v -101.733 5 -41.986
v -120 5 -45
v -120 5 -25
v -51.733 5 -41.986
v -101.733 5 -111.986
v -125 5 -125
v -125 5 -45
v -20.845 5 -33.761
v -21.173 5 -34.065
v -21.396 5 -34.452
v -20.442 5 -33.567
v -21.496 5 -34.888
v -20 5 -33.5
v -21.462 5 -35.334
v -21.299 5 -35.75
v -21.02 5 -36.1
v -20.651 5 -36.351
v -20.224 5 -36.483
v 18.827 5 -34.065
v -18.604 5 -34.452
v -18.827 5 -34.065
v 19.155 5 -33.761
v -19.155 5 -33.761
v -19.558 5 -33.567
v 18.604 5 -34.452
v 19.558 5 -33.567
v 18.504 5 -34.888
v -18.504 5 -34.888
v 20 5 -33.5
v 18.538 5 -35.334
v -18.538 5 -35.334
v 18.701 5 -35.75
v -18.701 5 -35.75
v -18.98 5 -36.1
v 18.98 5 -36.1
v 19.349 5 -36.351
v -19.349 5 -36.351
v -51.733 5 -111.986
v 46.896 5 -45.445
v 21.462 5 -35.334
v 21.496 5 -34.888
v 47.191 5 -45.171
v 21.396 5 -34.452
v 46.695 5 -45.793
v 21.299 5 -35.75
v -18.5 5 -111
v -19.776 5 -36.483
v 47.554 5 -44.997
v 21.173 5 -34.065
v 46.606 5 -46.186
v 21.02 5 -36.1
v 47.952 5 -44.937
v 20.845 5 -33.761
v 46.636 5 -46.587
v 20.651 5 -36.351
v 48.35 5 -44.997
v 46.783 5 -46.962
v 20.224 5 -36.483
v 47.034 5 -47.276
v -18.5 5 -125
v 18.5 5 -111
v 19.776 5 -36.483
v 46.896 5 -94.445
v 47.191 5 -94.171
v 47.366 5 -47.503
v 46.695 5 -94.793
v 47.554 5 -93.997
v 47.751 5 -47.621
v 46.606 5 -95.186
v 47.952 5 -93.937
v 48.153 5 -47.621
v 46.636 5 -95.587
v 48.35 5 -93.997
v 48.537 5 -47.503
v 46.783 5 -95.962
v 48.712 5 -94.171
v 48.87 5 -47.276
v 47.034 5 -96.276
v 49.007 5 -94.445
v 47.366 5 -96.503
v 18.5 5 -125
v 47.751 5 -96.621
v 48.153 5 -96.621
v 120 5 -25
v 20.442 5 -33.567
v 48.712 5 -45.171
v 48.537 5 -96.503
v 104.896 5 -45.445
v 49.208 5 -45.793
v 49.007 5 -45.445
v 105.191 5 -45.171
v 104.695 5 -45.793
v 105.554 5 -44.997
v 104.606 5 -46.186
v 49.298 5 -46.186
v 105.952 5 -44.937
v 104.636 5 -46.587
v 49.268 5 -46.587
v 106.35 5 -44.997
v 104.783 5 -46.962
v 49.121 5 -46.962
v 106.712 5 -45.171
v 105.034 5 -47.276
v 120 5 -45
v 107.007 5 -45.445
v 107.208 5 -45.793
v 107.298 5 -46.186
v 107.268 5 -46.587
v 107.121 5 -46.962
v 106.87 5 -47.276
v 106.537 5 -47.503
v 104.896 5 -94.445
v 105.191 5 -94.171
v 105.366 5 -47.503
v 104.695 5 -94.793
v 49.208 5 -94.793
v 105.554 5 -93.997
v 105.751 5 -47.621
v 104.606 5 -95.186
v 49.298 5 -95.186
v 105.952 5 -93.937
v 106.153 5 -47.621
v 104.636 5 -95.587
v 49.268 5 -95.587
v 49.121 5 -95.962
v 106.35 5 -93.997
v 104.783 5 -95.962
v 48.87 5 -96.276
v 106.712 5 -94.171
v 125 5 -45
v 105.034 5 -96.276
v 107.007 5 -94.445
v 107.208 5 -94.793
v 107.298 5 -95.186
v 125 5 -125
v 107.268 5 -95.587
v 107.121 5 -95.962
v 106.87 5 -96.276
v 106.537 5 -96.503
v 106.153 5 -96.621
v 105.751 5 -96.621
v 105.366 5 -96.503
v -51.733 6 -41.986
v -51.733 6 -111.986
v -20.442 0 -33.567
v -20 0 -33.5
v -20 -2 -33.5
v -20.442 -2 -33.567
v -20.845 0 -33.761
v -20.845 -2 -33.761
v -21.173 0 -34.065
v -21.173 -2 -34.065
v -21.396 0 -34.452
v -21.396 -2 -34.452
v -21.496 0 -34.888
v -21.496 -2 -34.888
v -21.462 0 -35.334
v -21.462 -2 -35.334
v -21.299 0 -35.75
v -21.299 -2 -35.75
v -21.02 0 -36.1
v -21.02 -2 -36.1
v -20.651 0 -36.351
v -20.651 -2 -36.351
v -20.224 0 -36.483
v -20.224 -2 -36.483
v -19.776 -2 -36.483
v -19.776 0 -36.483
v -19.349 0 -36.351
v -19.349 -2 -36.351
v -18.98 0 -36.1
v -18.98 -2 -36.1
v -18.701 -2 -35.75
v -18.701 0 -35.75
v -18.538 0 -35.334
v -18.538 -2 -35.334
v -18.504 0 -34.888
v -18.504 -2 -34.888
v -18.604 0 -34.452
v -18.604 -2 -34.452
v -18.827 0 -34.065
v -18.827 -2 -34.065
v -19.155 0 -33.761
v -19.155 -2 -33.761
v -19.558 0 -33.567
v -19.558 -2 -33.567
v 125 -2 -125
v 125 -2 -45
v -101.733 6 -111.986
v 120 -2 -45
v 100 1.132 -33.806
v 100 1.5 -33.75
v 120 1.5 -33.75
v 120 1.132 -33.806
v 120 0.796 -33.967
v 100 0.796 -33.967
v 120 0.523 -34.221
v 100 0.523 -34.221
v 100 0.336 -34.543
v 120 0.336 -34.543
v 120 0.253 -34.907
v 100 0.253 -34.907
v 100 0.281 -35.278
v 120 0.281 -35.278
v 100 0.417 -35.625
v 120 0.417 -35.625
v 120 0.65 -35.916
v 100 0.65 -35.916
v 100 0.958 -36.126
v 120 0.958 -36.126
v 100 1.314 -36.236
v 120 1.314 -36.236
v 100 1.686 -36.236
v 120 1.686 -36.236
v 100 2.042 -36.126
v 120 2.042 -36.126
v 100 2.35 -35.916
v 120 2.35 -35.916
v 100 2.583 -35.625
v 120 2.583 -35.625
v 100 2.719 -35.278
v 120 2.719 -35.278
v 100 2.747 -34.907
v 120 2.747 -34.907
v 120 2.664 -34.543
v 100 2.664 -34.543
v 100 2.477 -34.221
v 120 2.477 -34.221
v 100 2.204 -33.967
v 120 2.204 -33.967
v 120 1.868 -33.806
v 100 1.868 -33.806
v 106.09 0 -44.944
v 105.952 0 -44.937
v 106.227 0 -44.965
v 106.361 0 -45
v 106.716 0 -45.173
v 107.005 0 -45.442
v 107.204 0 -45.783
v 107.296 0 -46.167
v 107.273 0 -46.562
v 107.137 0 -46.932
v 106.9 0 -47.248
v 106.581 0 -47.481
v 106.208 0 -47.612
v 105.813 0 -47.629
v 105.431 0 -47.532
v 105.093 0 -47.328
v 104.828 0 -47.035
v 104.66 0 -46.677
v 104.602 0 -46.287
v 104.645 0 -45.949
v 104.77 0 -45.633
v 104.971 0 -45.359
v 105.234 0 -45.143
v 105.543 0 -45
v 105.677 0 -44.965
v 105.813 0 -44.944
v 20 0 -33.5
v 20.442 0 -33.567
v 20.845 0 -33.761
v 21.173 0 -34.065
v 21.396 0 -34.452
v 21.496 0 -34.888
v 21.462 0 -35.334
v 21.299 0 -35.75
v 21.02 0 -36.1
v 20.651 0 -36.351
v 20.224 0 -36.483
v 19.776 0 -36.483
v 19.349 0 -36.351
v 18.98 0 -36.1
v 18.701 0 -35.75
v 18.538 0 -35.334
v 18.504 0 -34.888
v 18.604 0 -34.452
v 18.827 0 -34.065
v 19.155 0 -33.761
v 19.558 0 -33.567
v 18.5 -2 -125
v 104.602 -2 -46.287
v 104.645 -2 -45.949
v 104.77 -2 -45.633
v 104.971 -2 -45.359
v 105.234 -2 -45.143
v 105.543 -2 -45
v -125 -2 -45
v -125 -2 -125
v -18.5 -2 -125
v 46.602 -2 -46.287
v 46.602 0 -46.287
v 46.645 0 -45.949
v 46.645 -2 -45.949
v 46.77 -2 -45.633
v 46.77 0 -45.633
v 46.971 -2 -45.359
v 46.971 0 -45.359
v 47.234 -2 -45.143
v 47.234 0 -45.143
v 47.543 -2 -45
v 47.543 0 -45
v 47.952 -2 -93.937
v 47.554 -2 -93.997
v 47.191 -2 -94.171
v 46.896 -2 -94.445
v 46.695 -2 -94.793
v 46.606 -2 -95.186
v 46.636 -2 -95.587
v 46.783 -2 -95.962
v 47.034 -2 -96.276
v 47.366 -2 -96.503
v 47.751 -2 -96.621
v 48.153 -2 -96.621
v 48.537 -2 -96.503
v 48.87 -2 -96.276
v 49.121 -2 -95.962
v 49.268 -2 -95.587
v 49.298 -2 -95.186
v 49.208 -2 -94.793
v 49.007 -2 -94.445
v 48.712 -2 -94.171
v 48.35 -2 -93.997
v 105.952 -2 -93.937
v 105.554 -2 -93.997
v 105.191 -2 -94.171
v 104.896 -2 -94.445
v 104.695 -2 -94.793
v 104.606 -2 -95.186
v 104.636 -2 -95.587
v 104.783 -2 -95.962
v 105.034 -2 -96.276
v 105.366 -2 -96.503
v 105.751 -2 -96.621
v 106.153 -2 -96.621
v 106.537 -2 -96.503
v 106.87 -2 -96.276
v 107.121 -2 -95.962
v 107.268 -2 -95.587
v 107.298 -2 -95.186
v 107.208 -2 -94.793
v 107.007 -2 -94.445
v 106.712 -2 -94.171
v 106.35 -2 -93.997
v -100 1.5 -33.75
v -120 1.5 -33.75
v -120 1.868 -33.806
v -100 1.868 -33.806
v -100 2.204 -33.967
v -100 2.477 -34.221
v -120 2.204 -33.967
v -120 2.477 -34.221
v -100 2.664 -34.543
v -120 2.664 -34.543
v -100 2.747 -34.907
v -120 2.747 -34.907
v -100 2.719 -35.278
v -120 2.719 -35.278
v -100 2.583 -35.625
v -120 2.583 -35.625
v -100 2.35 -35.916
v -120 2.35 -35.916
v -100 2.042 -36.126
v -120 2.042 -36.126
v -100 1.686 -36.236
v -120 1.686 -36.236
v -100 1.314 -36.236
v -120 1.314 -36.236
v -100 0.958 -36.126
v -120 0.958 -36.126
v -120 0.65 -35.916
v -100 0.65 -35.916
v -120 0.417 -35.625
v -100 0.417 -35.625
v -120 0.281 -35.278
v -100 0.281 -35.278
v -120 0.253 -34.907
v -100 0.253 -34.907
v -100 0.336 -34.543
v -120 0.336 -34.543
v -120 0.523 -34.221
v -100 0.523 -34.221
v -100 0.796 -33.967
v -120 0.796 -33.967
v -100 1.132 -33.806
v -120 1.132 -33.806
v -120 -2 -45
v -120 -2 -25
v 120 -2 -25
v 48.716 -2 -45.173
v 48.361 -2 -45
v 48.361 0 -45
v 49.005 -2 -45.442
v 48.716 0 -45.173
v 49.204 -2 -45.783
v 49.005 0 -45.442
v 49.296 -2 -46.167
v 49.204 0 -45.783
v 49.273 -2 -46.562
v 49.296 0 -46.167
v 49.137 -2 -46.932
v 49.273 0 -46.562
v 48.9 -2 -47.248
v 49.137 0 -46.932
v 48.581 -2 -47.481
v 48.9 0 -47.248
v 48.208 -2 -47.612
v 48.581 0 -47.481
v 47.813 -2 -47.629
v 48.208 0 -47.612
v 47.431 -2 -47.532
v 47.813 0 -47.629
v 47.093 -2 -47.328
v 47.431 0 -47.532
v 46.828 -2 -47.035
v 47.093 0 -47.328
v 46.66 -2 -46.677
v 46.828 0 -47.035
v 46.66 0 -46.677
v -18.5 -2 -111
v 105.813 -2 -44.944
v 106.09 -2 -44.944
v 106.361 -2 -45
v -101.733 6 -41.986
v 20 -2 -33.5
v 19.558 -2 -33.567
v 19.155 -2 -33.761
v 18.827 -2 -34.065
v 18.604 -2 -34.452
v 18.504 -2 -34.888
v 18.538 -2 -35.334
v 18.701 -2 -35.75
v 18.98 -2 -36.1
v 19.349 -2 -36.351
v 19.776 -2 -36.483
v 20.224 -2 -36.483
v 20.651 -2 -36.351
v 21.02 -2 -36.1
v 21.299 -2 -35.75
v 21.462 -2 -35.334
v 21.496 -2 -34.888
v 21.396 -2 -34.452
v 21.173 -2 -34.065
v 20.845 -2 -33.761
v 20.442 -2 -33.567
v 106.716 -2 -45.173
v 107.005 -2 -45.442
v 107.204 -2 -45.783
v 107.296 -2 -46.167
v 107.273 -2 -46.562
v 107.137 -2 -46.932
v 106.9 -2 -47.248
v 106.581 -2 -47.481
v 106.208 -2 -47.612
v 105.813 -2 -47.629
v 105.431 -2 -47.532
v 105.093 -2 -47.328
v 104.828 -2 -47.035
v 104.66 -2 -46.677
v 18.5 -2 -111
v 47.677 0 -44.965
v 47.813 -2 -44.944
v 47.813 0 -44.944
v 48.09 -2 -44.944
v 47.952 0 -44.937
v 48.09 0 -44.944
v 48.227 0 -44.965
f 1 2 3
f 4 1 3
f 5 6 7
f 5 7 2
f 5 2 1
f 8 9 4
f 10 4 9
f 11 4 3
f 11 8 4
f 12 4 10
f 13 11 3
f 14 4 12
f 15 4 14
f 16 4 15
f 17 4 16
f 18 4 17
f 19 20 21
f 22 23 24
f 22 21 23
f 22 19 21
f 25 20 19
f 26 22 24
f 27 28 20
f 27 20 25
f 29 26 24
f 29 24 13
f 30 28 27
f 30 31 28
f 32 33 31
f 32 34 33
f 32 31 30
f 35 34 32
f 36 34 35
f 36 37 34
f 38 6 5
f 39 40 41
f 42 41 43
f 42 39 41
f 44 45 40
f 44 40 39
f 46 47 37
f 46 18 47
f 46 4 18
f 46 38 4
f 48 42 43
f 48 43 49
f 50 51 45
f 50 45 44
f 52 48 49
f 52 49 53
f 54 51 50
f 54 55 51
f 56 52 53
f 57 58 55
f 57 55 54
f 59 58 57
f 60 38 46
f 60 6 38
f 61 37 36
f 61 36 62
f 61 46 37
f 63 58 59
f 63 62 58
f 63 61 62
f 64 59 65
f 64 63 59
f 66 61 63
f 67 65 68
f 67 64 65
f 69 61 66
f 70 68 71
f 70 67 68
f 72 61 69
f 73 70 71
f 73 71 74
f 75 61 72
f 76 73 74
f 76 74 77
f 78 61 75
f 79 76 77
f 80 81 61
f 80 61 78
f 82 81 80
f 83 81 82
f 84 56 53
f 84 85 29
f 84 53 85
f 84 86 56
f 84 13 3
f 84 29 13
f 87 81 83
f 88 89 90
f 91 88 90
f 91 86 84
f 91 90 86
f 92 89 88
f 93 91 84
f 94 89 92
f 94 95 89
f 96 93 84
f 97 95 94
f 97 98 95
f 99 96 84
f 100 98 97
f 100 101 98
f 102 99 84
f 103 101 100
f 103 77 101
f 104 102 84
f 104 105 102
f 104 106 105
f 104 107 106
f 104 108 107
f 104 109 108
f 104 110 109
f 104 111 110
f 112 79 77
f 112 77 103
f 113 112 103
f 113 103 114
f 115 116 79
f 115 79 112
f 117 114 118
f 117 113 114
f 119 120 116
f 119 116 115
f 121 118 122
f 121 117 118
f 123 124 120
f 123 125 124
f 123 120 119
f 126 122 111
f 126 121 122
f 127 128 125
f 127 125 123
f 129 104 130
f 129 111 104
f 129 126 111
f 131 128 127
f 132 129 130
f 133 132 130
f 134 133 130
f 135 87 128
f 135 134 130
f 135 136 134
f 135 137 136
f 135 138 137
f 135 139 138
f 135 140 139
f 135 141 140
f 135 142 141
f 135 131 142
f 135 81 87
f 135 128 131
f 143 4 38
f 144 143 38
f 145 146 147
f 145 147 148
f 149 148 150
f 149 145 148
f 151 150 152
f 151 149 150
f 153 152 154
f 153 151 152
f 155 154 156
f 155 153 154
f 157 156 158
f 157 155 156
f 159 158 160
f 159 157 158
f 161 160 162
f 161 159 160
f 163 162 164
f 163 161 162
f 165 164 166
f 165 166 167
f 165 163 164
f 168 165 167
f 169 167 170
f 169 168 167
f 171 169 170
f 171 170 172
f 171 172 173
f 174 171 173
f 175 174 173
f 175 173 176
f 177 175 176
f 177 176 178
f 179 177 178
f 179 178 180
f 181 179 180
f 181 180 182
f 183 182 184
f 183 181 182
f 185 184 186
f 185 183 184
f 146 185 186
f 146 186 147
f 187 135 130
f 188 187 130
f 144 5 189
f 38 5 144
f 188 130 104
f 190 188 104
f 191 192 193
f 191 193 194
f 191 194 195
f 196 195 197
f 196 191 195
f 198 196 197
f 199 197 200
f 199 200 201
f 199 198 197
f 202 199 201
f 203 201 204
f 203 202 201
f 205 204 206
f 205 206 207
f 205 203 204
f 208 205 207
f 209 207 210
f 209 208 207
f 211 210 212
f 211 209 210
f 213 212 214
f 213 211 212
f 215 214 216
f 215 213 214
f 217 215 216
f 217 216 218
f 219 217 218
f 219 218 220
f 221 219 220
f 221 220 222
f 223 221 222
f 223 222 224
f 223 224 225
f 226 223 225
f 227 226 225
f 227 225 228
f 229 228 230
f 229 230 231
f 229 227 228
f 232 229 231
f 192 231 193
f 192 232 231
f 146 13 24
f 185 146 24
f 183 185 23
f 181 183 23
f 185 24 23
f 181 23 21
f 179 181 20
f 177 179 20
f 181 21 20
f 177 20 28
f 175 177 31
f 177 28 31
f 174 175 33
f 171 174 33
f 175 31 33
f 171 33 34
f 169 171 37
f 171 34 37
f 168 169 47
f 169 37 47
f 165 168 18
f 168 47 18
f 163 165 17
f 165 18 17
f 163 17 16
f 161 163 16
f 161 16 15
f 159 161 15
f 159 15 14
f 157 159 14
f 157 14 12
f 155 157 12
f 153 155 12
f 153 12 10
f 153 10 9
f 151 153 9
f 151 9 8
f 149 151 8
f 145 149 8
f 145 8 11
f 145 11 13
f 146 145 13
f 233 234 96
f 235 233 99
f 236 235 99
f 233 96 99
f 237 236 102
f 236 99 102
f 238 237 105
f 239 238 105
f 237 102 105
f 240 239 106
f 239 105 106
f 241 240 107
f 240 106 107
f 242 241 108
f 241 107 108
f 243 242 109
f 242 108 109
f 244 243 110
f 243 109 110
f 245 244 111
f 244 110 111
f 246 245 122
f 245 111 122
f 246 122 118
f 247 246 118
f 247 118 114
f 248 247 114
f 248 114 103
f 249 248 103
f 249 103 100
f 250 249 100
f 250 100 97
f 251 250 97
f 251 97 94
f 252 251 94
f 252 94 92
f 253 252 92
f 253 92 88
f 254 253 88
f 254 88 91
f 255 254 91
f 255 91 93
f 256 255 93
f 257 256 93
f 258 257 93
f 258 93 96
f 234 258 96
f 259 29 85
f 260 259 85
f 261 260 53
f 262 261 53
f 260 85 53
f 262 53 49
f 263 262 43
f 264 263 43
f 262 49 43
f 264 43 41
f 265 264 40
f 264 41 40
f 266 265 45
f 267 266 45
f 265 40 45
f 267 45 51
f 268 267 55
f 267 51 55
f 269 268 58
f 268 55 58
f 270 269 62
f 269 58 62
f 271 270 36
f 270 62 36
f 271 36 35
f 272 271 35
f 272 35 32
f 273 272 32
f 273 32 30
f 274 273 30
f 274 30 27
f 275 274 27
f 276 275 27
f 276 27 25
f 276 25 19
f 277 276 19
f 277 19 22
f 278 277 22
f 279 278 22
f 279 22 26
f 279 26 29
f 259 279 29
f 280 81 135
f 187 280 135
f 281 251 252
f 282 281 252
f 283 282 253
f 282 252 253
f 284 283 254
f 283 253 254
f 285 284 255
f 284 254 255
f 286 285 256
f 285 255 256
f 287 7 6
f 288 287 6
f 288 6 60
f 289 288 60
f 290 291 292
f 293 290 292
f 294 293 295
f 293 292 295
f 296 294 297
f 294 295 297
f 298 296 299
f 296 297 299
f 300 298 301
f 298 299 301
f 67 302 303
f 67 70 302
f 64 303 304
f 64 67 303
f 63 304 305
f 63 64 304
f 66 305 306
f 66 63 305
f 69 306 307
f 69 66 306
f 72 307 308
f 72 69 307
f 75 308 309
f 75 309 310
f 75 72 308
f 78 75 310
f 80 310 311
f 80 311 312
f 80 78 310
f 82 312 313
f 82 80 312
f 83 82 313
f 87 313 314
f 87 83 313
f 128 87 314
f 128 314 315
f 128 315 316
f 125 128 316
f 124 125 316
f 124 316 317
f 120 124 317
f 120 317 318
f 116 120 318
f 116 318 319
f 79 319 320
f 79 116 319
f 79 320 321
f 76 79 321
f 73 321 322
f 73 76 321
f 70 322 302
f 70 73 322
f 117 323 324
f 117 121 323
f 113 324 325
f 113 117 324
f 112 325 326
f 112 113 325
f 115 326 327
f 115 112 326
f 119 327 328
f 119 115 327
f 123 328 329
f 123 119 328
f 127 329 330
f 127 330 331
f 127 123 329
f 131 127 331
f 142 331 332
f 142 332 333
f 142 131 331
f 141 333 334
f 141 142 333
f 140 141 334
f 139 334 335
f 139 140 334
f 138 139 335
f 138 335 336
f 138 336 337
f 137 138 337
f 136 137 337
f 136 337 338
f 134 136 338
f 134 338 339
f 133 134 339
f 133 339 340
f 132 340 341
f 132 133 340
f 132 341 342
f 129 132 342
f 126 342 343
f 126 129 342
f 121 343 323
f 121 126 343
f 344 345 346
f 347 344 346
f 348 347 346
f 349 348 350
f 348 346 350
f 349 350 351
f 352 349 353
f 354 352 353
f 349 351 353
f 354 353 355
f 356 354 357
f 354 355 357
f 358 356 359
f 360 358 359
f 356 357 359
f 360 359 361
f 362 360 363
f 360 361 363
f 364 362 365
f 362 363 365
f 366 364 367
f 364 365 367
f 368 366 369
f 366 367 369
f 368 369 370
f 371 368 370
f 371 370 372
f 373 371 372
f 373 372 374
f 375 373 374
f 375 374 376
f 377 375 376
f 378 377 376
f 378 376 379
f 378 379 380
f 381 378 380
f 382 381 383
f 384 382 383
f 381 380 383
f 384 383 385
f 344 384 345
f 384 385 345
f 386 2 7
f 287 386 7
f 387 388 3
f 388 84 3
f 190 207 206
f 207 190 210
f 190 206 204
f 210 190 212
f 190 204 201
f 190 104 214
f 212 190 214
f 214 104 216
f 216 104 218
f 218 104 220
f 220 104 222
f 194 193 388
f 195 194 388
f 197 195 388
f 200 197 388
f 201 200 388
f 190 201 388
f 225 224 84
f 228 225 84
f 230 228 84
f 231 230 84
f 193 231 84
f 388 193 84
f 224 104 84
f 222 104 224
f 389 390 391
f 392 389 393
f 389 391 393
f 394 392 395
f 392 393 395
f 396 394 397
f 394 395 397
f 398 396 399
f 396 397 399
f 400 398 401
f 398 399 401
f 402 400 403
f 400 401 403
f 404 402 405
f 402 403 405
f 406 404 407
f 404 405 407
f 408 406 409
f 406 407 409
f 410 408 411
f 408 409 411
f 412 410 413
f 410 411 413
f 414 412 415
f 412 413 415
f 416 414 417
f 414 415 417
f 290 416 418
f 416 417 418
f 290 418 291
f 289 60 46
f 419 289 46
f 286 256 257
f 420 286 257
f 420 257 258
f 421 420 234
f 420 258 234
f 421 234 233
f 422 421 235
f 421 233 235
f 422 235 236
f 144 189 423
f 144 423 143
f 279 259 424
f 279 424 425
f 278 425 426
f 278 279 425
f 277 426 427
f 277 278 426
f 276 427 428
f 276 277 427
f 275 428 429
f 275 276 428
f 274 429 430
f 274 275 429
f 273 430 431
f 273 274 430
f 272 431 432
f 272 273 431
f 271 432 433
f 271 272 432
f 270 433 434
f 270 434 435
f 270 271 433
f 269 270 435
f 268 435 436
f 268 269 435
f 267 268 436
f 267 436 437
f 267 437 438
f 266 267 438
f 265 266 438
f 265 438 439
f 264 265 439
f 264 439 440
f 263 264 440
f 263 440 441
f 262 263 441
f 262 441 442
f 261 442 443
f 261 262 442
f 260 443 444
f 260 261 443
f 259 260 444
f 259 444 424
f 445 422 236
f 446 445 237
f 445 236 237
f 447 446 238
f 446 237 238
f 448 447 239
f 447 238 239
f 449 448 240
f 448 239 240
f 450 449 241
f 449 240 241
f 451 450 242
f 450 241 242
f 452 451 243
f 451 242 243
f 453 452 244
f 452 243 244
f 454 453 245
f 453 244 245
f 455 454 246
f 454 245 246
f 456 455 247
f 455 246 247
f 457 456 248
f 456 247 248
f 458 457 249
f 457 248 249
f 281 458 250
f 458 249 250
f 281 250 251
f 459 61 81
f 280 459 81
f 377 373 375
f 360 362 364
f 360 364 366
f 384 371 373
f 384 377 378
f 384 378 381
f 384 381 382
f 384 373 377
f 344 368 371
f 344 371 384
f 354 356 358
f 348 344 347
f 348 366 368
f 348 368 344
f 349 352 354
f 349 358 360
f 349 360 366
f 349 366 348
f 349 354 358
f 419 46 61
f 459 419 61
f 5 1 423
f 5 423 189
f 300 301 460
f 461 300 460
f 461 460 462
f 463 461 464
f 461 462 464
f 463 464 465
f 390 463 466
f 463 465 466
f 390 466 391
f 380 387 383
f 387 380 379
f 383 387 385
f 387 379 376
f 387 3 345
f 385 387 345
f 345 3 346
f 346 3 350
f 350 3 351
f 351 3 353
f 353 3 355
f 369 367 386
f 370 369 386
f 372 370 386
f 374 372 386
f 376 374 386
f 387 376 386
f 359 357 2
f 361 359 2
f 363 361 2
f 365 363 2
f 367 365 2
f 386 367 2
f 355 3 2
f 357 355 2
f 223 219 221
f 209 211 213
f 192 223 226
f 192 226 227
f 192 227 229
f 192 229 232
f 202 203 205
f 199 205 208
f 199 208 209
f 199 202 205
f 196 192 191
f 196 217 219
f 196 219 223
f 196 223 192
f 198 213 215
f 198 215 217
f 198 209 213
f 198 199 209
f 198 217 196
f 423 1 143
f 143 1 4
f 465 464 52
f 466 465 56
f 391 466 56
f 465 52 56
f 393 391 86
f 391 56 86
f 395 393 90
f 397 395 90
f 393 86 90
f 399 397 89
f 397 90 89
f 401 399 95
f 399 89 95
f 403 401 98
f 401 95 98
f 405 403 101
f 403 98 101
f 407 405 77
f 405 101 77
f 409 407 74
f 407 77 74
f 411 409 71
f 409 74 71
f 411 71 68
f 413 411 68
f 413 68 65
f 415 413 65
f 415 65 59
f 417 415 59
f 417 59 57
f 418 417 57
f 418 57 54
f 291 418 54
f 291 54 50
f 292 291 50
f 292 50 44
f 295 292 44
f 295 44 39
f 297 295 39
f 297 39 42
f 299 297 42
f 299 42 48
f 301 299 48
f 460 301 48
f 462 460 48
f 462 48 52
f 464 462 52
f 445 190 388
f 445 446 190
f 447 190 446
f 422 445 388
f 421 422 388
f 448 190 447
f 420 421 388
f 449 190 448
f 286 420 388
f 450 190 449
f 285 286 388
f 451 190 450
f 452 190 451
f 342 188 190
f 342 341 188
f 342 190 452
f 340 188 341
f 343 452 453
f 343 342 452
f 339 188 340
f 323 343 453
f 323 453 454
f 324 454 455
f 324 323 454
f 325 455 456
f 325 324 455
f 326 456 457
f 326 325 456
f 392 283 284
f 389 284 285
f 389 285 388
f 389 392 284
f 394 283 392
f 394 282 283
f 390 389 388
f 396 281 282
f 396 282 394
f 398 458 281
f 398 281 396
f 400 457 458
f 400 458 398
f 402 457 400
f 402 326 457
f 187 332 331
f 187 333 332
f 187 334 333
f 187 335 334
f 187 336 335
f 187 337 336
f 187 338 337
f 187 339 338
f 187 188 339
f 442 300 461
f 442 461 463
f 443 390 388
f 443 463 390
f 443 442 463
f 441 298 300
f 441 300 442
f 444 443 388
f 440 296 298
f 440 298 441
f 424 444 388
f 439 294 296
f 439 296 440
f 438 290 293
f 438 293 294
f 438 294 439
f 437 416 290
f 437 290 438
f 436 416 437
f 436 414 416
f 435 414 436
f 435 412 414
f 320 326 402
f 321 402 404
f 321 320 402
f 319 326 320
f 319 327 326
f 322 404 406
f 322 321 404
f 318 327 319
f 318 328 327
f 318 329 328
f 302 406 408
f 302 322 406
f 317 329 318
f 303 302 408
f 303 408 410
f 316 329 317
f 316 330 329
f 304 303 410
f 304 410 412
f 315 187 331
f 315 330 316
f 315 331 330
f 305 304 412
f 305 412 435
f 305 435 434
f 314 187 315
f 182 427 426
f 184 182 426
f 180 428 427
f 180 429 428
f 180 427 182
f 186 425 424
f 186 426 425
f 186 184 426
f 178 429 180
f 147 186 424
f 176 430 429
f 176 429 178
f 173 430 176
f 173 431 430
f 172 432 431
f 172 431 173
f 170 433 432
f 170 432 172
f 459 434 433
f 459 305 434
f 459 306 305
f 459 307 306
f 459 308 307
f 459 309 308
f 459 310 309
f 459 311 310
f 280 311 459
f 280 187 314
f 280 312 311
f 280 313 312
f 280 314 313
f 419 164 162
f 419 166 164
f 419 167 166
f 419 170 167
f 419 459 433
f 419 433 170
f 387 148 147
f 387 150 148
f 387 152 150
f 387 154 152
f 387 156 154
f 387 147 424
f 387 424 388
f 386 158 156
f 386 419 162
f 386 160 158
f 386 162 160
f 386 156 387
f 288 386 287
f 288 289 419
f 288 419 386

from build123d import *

# Parameters (mm, degrees)
SKIZZE1_W                             = 250
SKIZZE1_H                             = 250
AUFSATZ_LINEAR_AUSTRAGEN1_DEPTH       = 5
SKIZZE2_W                             = 40
SKIZZE2_H                             = 40
AUFSATZ_LINEAR_AUSTRAGEN2_DEPTH       = 15
SKIZZE3_R                             = 1.65
SKIZZE3_W                             = 30
SKIZZE3_H                             = 30
SCHNITT_LINEAR_AUSTRAGEN1_DEPTH       = 15
SKIZZE4_R                             = 1.65
SKIZZE4_W                             = 30
SKIZZE4_H                             = 30
SCHNITT_LINEAR_AUSTRAGEN2_DEPTH       = 15
SKIZZE6_W                             = 40
SKIZZE6_H                             = 40
AUFSATZ_LINEAR_AUSTRAGEN3_DEPTH       = 5
SKIZZE7_W                             = 40
SKIZZE7_H                             = 40
SCHNITT_LINEAR_AUSTRAGEN3_DEPTH       = 43
SKIZZE8_W                             = 30
SKIZZE8_H                             = 30
AUFSATZ_LINEAR_AUSTRAGEN4_DEPTH       = 5
SKIZZE9_W                             = 45
SKIZZE9_H                             = 45
AUFSATZ_LINEAR_AUSTRAGEN5_DEPTH       = 15
SKIZZE10_W                            = 8
SKIZZE10_H                            = 8
AUFSATZ_LINEAR_AUSTRAGEN6_DEPTH       = 34
SKIZZE11_R                            = 2.15
SCHNITT_LINEAR_AUSTRAGEN4_DEPTH       = 34
SKIZZE12_W                            = 143.062860871
SKIZZE12_H                            = 184.486429343
SCHNITT_LINEAR_AUSTRAGEN5_DEPTH       = 60
SKIZZE13_W                            = 45
SKIZZE13_H                            = 45
AUFSATZ_LINEAR_AUSTRAGEN7_DEPTH       = 15
SKIZZE14_W                            = 8
SKIZZE14_H                            = 8
AUFSATZ_LINEAR_AUSTRAGEN8_DEPTH       = 34
SKIZZE15_W                            = 37
SKIZZE15_H                            = 14
SCHNITT_LINEAR_AUSTRAGEN6_DEPTH       = 10
SKIZZE16_W                            = 50
SKIZZE16_H                            = 70
AUFSATZ_LINEAR_AUSTRAGEN9_DEPTH       = 1
SKIZZE17_R                            = 1.35
SCHNITT_LINEAR_AUSTRAGEN7_DEPTH       = 21
SKIZZE18_R                            = 2.15
SCHNITT_LINEAR_AUSTRAGEN8_DEPTH       = 21
SKIZZE19_R                            = 2.15
SCHNITT_LINEAR_AUSTRAGEN9_DEPTH       = 21
SCHNITT_LINEAR_AUSTRAGEN10_DEPTH      = 35
SCHNITT_LINEAR_AUSTRAGEN10_DEPTH_BACK = 36
SKIZZE20_W                            = 250
SKIZZE20_H                            = 150
SKIZZE21_W                            = 5
SKIZZE21_H                            = 20
SCHNITT_LINEAR_AUSTRAGEN11_DEPTH      = 10
SKIZZE22_R                            = 1.25
SCHNITT_LINEAR_AUSTRAGEN13_DEPTH      = 20
SCHNITT_LINEAR_START                  = -20
SKIZZE25_R                            = 1.25
SCHNITT_LINEAR_AUSTRAGEN14_DEPTH      = 20
SKIZZE26_R                            = 1.5
SCHNITT_LINEAR_AUSTRAGEN15_DEPTH      = 10
SKIZZE28_R                            = 1.35
SKIZZE28_R_2                          = 1.5
AUFSATZ_LINEAR_AUSTRAGEN10_DEPTH      = 2


with BuildPart() as part:
    # Skizze1 → Aufsatz-Linear austragen1 (new body)
    with BuildSketch(Plane(origin=(0, 0, 0), x_dir=(1, 0, 0), z_dir=(0, 1, 0))):
        Rectangle(SKIZZE1_W, SKIZZE1_H)
    extrude(amount=AUFSATZ_LINEAR_AUSTRAGEN1_DEPTH)

    # Skizze2 → Aufsatz-Linear austragen2 (add)
    with BuildSketch(Plane(origin=(0, 5, 0), x_dir=(1, 0, 0), z_dir=(0, 1, 0))):
        Polygon((-100.127507589, -114.480956566), (-112.127507589, -114.480956566), (-112.127507589, -92.480956566), (-120.127507589, -92.480956566), (-120.127507589, -122.480956566), (-100.127507589, -122.480956566), align=None)
        Polygon((-66.127507589, -114.480956566), (-78.127507589, -114.480956566), (-78.127507589, -122.480956566), (-58.127507589, -122.480956566), (-58.127507589, -92.480956566), (-66.127507589, -92.480956566), align=None)
        Polygon((-66.127507589, -3.480956566), (-66.127507589, -25.480956566), (-58.127507589, -25.480956566), (-58.127507589, 4.519043434), (-78.127507589, 4.519043434), (-78.127507589, -3.480956566), align=None)
        Polygon((-120.127507589, -25.480956566), (-112.127507589, -25.480956566), (-112.127507589, -3.480956566), (-100.127507589, -3.480956566), (-100.127507589, 4.519043434), (-120.127507589, 4.519043434), align=None)
        with Locations((0, -85)):
            Rectangle(SKIZZE2_W, SKIZZE2_H)
        with Locations((85, 0)):
            Rectangle(SKIZZE2_W, SKIZZE2_H)
    extrude(amount=AUFSATZ_LINEAR_AUSTRAGEN2_DEPTH)

    # Skizze3 → Schnitt-Linear austragen1 (cut)
    with BuildSketch(Plane(origin=(0, 20, 0), x_dir=(1, 0, 0), z_dir=(0, 1, 0))):
        Circle(SKIZZE3_R)
        with Locations((85, 0)):
            Rectangle(SKIZZE3_W, SKIZZE3_H)
        with Locations((0, -85)):
            Rectangle(SKIZZE3_W, SKIZZE3_H)
    extrude(amount=-SCHNITT_LINEAR_AUSTRAGEN1_DEPTH, mode=Mode.SUBTRACT)

    # Skizze4 → Schnitt-Linear austragen2 (cut)
    with BuildSketch(Plane(origin=(0, 5, 0), x_dir=(1, 0, 0), z_dir=(0, 1, 0))):
        with Locations(Location((0, 0, 0), (0, 0, 270))):
            Circle(SKIZZE4_R)
        with Locations((0, -85)):
            Rectangle(SKIZZE4_W, SKIZZE4_H)
        with Locations((85, 0)):
            Rectangle(SKIZZE4_W, SKIZZE4_H)
    extrude(amount=-SCHNITT_LINEAR_AUSTRAGEN2_DEPTH, mode=Mode.SUBTRACT)

    # Skizze6 → Aufsatz-Linear austragen3 (add)
    with BuildSketch(Plane(origin=(0, 20, 0), x_dir=(1, 0, 0), z_dir=(0, 1, 0))):
        with Locations((0, -85)):
            Rectangle(SKIZZE6_W, SKIZZE6_H)
        with Locations((85, 0)):
            Rectangle(SKIZZE6_W, SKIZZE6_H)
    extrude(amount=-AUFSATZ_LINEAR_AUSTRAGEN3_DEPTH)

    # Skizze7 → Schnitt-Linear austragen3 (cut)
    with BuildSketch(Plane(origin=(0, 5, 0), x_dir=(1, 0, 0), z_dir=(0, 1, 0))):
        with Locations((0, -85)):
            Rectangle(SKIZZE7_W, SKIZZE7_H)
        with Locations((85, 0)):
            Rectangle(SKIZZE7_W, SKIZZE7_H)
    extrude(amount=SCHNITT_LINEAR_AUSTRAGEN3_DEPTH, mode=Mode.SUBTRACT)

    # Skizze8 → Aufsatz-Linear austragen4 (add)
    with BuildSketch(Plane(origin=(0, 5, 0), x_dir=(1, 0, 0), z_dir=(0, 1, 0))):
        with Locations((0, -85)):
            Rectangle(SKIZZE8_W, SKIZZE8_H)
        with Locations((85, 0)):
            Rectangle(SKIZZE8_W, SKIZZE8_H)
    extrude(amount=-AUFSATZ_LINEAR_AUSTRAGEN4_DEPTH)

    # Skizze9 → Aufsatz-Linear austragen5 (add)
    with BuildSketch(Plane(origin=(0, 5, 0), x_dir=(1, 0, 0), z_dir=(0, 1, 0))):
        with Locations((16.5, -93.5)):
            Rectangle(SKIZZE9_W, SKIZZE9_H)
        with Locations((93.5, -16.5)):
            Rectangle(SKIZZE9_W, SKIZZE9_H)
    extrude(amount=AUFSATZ_LINEAR_AUSTRAGEN5_DEPTH)

    # Skizze10 → Aufsatz-Linear austragen6 (add)
    with BuildSketch(Plane(origin=(0, 5, 0), x_dir=(1, 0, 0), z_dir=(0, 1, 0))):
        with Locations((-10, -89)):
            Rectangle(SKIZZE10_W, SKIZZE10_H)
        with Locations((43, -89)):
            Rectangle(SKIZZE10_W, SKIZZE10_H)
        with Locations((89, 10)):
            Rectangle(SKIZZE10_W, SKIZZE10_H)
        with Locations((89, -43)):
            Rectangle(SKIZZE10_W, SKIZZE10_H)
    extrude(amount=AUFSATZ_LINEAR_AUSTRAGEN6_DEPTH)

    # Skizze11 → Schnitt-Linear austragen4 (cut)
    with BuildSketch(Plane(origin=(0, 0, 85), x_dir=(-1, 0, 0), z_dir=(0, 0, -1))):
        with Locations((10.85, 34.05)):
            Circle(SKIZZE11_R)
        with Locations((10.85, 24.35)):
            Circle(SKIZZE11_R)
        with Locations((-43.85, 34.05)):
            Circle(SKIZZE11_R)
        with Locations((-43.85, 24.35)):
            Circle(SKIZZE11_R)
    extrude(amount=-SCHNITT_LINEAR_AUSTRAGEN4_DEPTH, mode=Mode.SUBTRACT)

    # Skizze12 → Schnitt-Linear austragen5 (cut)
    with BuildSketch(Plane(origin=(0, 5, 0), x_dir=(1, 0, 0), z_dir=(0, 1, 0))):
        with Locations((48.924998025, -26.491593456)):
            Rectangle(SKIZZE12_W, SKIZZE12_H)
    extrude(amount=SCHNITT_LINEAR_AUSTRAGEN5_DEPTH, mode=Mode.SUBTRACT)

    # Skizze13 → Aufsatz-Linear austragen7 (add)
    with BuildSketch(Plane(origin=(0, 5, 0), x_dir=(1, 0, 0), z_dir=(0, 1, 0))):
        with Locations((16.5, -96.5)):
            Rectangle(SKIZZE13_W, SKIZZE13_H)
        with Locations((96.5, -16.5)):
            Rectangle(SKIZZE13_W, SKIZZE13_H)
    extrude(amount=AUFSATZ_LINEAR_AUSTRAGEN7_DEPTH)

    # Skizze14 → Aufsatz-Linear austragen8 (add)
    with BuildSketch(Plane(origin=(0, 5, 0), x_dir=(1, 0, 0), z_dir=(0, 1, 0))):
        with Locations((-10, -91)):
            Rectangle(SKIZZE14_W, SKIZZE14_H)
        with Locations((43, -91)):
            Rectangle(SKIZZE14_W, SKIZZE14_H)
        with Locations((91, -43)):
            Rectangle(SKIZZE14_W, SKIZZE14_H)
        with Locations((91, 10)):
            Rectangle(SKIZZE14_W, SKIZZE14_H)
    extrude(amount=AUFSATZ_LINEAR_AUSTRAGEN8_DEPTH)

    # Skizze15 → Schnitt-Linear austragen6 (cut)
    with BuildSketch(Plane(origin=(0, 5, 0), x_dir=(1, 0, 0), z_dir=(0, 1, 0))):
        with Locations((0, 118)):
            Rectangle(SKIZZE15_W, SKIZZE15_H)
    extrude(amount=-SCHNITT_LINEAR_AUSTRAGEN6_DEPTH, mode=Mode.SUBTRACT)

    # Skizze16 → Aufsatz-Linear austragen9 (add)
    with BuildSketch(Plane(origin=(0, 5, 0), x_dir=(1, 0, 0), z_dir=(0, 1, 0))):
        with Locations((-76.733084372, 76.985715353)):
            Rectangle(SKIZZE16_W, SKIZZE16_H)
    extrude(amount=AUFSATZ_LINEAR_AUSTRAGEN9_DEPTH)

    # Skizze17 → Schnitt-Linear austragen7 (cut)
    with BuildSketch(Plane(origin=(0, 5, 0), x_dir=(1, 0, 0), z_dir=(0, 1, 0))):
        with Locations(Location((105.951755746, 46.286528094, 0), (0, 0, 270))):
            Circle(SKIZZE17_R)
        with Locations(Location((105.951755746, 95.286528094, 0), (0, 0, 270))):
            Circle(SKIZZE17_R)
        with Locations(Location((47.951755746, 46.286528094, 0), (0, 0, 270))):
            Circle(SKIZZE17_R)
        with Locations(Location((47.951755746, 95.286528094, 0), (0, 0, 270))):
            Circle(SKIZZE17_R)
    extrude(amount=-SCHNITT_LINEAR_AUSTRAGEN7_DEPTH, mode=Mode.SUBTRACT)

    # Skizze18 → Schnitt-Linear austragen8 (cut)
    with BuildSketch(Plane(origin=(0, 0, 87), x_dir=(-1, 0, 0), z_dir=(0, 0, -1))):
        with Locations((10.85, 34.05)):
            Circle(SKIZZE18_R)
        with Locations((10.85, 24.35)):
            Circle(SKIZZE18_R)
        with Locations((-43.85, 34.05)):
            Circle(SKIZZE18_R)
        with Locations((-43.85, 24.35)):
            Circle(SKIZZE18_R)
    extrude(amount=-SCHNITT_LINEAR_AUSTRAGEN8_DEPTH, mode=Mode.SUBTRACT)

    # Skizze19 → Schnitt-Linear austragen9 (cut)
    with BuildSketch(Plane.ZY.offset(-87)):
        with Locations((43.85, 34.05)):
            Circle(SKIZZE19_R)
        with Locations((43.85, 24.35)):
            Circle(SKIZZE19_R)
        with Locations((-10.85, 34.05)):
            Circle(SKIZZE19_R)
        with Locations((-10.85, 24.35)):
            Circle(SKIZZE19_R)
    extrude(amount=-SCHNITT_LINEAR_AUSTRAGEN9_DEPTH, mode=Mode.SUBTRACT)

    # Skizze20 → Schnitt-Linear austragen10 (cut, two sides: drawn at the far end of the back side and taken through both)
    with BuildSketch(Plane(origin=(0, 5, 0), x_dir=(1, 0, 0), z_dir=(0, 1, 0)).offset(-SCHNITT_LINEAR_AUSTRAGEN10_DEPTH_BACK)):
        with Locations((0, -50)):
            Rectangle(SKIZZE20_W, SKIZZE20_H)
    extrude(amount=SCHNITT_LINEAR_AUSTRAGEN10_DEPTH + SCHNITT_LINEAR_AUSTRAGEN10_DEPTH_BACK, mode=Mode.SUBTRACT)

    # Skizze21 → Schnitt-Linear austragen11 (cut)
    with BuildSketch(Plane(origin=(0, 5, 0), x_dir=(1, 0, 0), z_dir=(0, 1, 0))):
        with Locations((122.5, 35)):
            Rectangle(SKIZZE21_W, SKIZZE21_H)
        with Locations((-122.5, 35)):
            Rectangle(SKIZZE21_W, SKIZZE21_H)
    extrude(amount=-SCHNITT_LINEAR_AUSTRAGEN11_DEPTH, mode=Mode.SUBTRACT)

    # Skizze22 → Schnitt-Linear austragen13 (cut)
    with BuildSketch(Plane.ZY.offset(120)):
        with Locations((-35, 1.5)):
            Circle(SKIZZE22_R)
    extrude(amount=-SCHNITT_LINEAR_AUSTRAGEN13_DEPTH, mode=Mode.SUBTRACT)

    # Skizze25 → Schnitt-Linear austragen14 (cut)
    with BuildSketch(Plane(origin=(120, 0, 0), x_dir=(0, 0, -1), z_dir=(1, 0, 0)).offset(SCHNITT_LINEAR_START)):
        with Locations(Location((35, 1.5, 0), (0, 0, 180))):
            Circle(SKIZZE25_R)
    extrude(amount=SCHNITT_LINEAR_AUSTRAGEN14_DEPTH, mode=Mode.SUBTRACT)

    # Skizze26 → Schnitt-Linear austragen15 (cut)
    with BuildSketch(Plane(origin=(0, 5, 0), x_dir=(1, 0, 0), z_dir=(0, 1, 0))):
        with Locations(Location((-20, 35, 0), (0, 0, 270))):
            Circle(SKIZZE26_R)
        with Locations(Location((20, 35, 0), (0, 0, 270))):
            Circle(SKIZZE26_R)
    extrude(amount=-SCHNITT_LINEAR_AUSTRAGEN15_DEPTH, mode=Mode.SUBTRACT)

    # Skizze28 → Aufsatz-Linear austragen10 (add)
    # profile 1 of 2: a face of its own
    with BuildSketch(Plane(origin=(0, 0, 0), x_dir=(-1, 0, 0), z_dir=(0, -1, 0))):
        with BuildLine():
            Line((-125, 125), (-125, 45))
            Line((-125, 45), (-120, 45))
            Line((-120, 45), (-106.360834546, 45))
            ThreePointArc((-106.360834546, 45), (-106.748701045, 47.376196938), (-104.601755746, 46.286528094))
            ThreePointArc((-104.601755746, 46.286528094), (-104.862086902, 45.489582794), (-105.542676946, 45))
            Line((-105.542676946, 45), (-48.360834546, 45))
            ThreePointArc((-48.360834546, 45), (-48.748701045, 47.376196938), (-46.601755746, 46.286528094))
            ThreePointArc((-46.601755746, 46.286528094), (-46.862086902, 45.489582794), (-47.542676946, 45))
            Line((-47.542676946, 45), (120, 45))
            Line((120, 45), (125, 45))
            Line((125, 45), (125, 125))
            Line((125, 125), (18.5, 125))
            Line((18.5, 125), (18.5, 111))
            Line((18.5, 111), (-18.5, 111))
            Line((-18.5, 111), (-18.5, 125))
            Line((-18.5, 125), (-125, 125))
        make_face()
        with Locations(Location((-105.951755746, 95.286528094, 0), (0, 0, 270))):
            Circle(SKIZZE28_R, mode=Mode.SUBTRACT)
        with Locations(Location((-47.951755746, 95.286528094, 0), (0, 0, 270))):
            Circle(SKIZZE28_R, mode=Mode.SUBTRACT)
    # profile 2 of 2: a face of its own
    with BuildSketch(Plane(origin=(0, 0, 0), x_dir=(-1, 0, 0), z_dir=(0, -1, 0))):
        with BuildLine():
            Line((-106.360834546, 45), (-120, 45))
            Line((-120, 45), (-120, 25))
            Line((-120, 25), (120, 25))
            Line((120, 25), (120, 45))
            Line((120, 45), (-47.542676946, 45))
            ThreePointArc((-47.542676946, 45), (-47.951755746, 44.936528094), (-48.360834546, 45))
            Line((-48.360834546, 45), (-105.542676946, 45))
            ThreePointArc((-105.542676946, 45), (-105.951755746, 44.936528094), (-106.360834546, 45))
        make_face()
        with Locations(Location((-20, 35, 0), (0, 0, 270))):
            Circle(SKIZZE28_R_2, mode=Mode.SUBTRACT)
        with Locations(Location((20, 35, 0), (0, 0, 270))):
            Circle(SKIZZE28_R_2, mode=Mode.SUBTRACT)
    extrude(amount=AUFSATZ_LINEAR_AUSTRAGEN10_DEPTH)


solid = part.part
